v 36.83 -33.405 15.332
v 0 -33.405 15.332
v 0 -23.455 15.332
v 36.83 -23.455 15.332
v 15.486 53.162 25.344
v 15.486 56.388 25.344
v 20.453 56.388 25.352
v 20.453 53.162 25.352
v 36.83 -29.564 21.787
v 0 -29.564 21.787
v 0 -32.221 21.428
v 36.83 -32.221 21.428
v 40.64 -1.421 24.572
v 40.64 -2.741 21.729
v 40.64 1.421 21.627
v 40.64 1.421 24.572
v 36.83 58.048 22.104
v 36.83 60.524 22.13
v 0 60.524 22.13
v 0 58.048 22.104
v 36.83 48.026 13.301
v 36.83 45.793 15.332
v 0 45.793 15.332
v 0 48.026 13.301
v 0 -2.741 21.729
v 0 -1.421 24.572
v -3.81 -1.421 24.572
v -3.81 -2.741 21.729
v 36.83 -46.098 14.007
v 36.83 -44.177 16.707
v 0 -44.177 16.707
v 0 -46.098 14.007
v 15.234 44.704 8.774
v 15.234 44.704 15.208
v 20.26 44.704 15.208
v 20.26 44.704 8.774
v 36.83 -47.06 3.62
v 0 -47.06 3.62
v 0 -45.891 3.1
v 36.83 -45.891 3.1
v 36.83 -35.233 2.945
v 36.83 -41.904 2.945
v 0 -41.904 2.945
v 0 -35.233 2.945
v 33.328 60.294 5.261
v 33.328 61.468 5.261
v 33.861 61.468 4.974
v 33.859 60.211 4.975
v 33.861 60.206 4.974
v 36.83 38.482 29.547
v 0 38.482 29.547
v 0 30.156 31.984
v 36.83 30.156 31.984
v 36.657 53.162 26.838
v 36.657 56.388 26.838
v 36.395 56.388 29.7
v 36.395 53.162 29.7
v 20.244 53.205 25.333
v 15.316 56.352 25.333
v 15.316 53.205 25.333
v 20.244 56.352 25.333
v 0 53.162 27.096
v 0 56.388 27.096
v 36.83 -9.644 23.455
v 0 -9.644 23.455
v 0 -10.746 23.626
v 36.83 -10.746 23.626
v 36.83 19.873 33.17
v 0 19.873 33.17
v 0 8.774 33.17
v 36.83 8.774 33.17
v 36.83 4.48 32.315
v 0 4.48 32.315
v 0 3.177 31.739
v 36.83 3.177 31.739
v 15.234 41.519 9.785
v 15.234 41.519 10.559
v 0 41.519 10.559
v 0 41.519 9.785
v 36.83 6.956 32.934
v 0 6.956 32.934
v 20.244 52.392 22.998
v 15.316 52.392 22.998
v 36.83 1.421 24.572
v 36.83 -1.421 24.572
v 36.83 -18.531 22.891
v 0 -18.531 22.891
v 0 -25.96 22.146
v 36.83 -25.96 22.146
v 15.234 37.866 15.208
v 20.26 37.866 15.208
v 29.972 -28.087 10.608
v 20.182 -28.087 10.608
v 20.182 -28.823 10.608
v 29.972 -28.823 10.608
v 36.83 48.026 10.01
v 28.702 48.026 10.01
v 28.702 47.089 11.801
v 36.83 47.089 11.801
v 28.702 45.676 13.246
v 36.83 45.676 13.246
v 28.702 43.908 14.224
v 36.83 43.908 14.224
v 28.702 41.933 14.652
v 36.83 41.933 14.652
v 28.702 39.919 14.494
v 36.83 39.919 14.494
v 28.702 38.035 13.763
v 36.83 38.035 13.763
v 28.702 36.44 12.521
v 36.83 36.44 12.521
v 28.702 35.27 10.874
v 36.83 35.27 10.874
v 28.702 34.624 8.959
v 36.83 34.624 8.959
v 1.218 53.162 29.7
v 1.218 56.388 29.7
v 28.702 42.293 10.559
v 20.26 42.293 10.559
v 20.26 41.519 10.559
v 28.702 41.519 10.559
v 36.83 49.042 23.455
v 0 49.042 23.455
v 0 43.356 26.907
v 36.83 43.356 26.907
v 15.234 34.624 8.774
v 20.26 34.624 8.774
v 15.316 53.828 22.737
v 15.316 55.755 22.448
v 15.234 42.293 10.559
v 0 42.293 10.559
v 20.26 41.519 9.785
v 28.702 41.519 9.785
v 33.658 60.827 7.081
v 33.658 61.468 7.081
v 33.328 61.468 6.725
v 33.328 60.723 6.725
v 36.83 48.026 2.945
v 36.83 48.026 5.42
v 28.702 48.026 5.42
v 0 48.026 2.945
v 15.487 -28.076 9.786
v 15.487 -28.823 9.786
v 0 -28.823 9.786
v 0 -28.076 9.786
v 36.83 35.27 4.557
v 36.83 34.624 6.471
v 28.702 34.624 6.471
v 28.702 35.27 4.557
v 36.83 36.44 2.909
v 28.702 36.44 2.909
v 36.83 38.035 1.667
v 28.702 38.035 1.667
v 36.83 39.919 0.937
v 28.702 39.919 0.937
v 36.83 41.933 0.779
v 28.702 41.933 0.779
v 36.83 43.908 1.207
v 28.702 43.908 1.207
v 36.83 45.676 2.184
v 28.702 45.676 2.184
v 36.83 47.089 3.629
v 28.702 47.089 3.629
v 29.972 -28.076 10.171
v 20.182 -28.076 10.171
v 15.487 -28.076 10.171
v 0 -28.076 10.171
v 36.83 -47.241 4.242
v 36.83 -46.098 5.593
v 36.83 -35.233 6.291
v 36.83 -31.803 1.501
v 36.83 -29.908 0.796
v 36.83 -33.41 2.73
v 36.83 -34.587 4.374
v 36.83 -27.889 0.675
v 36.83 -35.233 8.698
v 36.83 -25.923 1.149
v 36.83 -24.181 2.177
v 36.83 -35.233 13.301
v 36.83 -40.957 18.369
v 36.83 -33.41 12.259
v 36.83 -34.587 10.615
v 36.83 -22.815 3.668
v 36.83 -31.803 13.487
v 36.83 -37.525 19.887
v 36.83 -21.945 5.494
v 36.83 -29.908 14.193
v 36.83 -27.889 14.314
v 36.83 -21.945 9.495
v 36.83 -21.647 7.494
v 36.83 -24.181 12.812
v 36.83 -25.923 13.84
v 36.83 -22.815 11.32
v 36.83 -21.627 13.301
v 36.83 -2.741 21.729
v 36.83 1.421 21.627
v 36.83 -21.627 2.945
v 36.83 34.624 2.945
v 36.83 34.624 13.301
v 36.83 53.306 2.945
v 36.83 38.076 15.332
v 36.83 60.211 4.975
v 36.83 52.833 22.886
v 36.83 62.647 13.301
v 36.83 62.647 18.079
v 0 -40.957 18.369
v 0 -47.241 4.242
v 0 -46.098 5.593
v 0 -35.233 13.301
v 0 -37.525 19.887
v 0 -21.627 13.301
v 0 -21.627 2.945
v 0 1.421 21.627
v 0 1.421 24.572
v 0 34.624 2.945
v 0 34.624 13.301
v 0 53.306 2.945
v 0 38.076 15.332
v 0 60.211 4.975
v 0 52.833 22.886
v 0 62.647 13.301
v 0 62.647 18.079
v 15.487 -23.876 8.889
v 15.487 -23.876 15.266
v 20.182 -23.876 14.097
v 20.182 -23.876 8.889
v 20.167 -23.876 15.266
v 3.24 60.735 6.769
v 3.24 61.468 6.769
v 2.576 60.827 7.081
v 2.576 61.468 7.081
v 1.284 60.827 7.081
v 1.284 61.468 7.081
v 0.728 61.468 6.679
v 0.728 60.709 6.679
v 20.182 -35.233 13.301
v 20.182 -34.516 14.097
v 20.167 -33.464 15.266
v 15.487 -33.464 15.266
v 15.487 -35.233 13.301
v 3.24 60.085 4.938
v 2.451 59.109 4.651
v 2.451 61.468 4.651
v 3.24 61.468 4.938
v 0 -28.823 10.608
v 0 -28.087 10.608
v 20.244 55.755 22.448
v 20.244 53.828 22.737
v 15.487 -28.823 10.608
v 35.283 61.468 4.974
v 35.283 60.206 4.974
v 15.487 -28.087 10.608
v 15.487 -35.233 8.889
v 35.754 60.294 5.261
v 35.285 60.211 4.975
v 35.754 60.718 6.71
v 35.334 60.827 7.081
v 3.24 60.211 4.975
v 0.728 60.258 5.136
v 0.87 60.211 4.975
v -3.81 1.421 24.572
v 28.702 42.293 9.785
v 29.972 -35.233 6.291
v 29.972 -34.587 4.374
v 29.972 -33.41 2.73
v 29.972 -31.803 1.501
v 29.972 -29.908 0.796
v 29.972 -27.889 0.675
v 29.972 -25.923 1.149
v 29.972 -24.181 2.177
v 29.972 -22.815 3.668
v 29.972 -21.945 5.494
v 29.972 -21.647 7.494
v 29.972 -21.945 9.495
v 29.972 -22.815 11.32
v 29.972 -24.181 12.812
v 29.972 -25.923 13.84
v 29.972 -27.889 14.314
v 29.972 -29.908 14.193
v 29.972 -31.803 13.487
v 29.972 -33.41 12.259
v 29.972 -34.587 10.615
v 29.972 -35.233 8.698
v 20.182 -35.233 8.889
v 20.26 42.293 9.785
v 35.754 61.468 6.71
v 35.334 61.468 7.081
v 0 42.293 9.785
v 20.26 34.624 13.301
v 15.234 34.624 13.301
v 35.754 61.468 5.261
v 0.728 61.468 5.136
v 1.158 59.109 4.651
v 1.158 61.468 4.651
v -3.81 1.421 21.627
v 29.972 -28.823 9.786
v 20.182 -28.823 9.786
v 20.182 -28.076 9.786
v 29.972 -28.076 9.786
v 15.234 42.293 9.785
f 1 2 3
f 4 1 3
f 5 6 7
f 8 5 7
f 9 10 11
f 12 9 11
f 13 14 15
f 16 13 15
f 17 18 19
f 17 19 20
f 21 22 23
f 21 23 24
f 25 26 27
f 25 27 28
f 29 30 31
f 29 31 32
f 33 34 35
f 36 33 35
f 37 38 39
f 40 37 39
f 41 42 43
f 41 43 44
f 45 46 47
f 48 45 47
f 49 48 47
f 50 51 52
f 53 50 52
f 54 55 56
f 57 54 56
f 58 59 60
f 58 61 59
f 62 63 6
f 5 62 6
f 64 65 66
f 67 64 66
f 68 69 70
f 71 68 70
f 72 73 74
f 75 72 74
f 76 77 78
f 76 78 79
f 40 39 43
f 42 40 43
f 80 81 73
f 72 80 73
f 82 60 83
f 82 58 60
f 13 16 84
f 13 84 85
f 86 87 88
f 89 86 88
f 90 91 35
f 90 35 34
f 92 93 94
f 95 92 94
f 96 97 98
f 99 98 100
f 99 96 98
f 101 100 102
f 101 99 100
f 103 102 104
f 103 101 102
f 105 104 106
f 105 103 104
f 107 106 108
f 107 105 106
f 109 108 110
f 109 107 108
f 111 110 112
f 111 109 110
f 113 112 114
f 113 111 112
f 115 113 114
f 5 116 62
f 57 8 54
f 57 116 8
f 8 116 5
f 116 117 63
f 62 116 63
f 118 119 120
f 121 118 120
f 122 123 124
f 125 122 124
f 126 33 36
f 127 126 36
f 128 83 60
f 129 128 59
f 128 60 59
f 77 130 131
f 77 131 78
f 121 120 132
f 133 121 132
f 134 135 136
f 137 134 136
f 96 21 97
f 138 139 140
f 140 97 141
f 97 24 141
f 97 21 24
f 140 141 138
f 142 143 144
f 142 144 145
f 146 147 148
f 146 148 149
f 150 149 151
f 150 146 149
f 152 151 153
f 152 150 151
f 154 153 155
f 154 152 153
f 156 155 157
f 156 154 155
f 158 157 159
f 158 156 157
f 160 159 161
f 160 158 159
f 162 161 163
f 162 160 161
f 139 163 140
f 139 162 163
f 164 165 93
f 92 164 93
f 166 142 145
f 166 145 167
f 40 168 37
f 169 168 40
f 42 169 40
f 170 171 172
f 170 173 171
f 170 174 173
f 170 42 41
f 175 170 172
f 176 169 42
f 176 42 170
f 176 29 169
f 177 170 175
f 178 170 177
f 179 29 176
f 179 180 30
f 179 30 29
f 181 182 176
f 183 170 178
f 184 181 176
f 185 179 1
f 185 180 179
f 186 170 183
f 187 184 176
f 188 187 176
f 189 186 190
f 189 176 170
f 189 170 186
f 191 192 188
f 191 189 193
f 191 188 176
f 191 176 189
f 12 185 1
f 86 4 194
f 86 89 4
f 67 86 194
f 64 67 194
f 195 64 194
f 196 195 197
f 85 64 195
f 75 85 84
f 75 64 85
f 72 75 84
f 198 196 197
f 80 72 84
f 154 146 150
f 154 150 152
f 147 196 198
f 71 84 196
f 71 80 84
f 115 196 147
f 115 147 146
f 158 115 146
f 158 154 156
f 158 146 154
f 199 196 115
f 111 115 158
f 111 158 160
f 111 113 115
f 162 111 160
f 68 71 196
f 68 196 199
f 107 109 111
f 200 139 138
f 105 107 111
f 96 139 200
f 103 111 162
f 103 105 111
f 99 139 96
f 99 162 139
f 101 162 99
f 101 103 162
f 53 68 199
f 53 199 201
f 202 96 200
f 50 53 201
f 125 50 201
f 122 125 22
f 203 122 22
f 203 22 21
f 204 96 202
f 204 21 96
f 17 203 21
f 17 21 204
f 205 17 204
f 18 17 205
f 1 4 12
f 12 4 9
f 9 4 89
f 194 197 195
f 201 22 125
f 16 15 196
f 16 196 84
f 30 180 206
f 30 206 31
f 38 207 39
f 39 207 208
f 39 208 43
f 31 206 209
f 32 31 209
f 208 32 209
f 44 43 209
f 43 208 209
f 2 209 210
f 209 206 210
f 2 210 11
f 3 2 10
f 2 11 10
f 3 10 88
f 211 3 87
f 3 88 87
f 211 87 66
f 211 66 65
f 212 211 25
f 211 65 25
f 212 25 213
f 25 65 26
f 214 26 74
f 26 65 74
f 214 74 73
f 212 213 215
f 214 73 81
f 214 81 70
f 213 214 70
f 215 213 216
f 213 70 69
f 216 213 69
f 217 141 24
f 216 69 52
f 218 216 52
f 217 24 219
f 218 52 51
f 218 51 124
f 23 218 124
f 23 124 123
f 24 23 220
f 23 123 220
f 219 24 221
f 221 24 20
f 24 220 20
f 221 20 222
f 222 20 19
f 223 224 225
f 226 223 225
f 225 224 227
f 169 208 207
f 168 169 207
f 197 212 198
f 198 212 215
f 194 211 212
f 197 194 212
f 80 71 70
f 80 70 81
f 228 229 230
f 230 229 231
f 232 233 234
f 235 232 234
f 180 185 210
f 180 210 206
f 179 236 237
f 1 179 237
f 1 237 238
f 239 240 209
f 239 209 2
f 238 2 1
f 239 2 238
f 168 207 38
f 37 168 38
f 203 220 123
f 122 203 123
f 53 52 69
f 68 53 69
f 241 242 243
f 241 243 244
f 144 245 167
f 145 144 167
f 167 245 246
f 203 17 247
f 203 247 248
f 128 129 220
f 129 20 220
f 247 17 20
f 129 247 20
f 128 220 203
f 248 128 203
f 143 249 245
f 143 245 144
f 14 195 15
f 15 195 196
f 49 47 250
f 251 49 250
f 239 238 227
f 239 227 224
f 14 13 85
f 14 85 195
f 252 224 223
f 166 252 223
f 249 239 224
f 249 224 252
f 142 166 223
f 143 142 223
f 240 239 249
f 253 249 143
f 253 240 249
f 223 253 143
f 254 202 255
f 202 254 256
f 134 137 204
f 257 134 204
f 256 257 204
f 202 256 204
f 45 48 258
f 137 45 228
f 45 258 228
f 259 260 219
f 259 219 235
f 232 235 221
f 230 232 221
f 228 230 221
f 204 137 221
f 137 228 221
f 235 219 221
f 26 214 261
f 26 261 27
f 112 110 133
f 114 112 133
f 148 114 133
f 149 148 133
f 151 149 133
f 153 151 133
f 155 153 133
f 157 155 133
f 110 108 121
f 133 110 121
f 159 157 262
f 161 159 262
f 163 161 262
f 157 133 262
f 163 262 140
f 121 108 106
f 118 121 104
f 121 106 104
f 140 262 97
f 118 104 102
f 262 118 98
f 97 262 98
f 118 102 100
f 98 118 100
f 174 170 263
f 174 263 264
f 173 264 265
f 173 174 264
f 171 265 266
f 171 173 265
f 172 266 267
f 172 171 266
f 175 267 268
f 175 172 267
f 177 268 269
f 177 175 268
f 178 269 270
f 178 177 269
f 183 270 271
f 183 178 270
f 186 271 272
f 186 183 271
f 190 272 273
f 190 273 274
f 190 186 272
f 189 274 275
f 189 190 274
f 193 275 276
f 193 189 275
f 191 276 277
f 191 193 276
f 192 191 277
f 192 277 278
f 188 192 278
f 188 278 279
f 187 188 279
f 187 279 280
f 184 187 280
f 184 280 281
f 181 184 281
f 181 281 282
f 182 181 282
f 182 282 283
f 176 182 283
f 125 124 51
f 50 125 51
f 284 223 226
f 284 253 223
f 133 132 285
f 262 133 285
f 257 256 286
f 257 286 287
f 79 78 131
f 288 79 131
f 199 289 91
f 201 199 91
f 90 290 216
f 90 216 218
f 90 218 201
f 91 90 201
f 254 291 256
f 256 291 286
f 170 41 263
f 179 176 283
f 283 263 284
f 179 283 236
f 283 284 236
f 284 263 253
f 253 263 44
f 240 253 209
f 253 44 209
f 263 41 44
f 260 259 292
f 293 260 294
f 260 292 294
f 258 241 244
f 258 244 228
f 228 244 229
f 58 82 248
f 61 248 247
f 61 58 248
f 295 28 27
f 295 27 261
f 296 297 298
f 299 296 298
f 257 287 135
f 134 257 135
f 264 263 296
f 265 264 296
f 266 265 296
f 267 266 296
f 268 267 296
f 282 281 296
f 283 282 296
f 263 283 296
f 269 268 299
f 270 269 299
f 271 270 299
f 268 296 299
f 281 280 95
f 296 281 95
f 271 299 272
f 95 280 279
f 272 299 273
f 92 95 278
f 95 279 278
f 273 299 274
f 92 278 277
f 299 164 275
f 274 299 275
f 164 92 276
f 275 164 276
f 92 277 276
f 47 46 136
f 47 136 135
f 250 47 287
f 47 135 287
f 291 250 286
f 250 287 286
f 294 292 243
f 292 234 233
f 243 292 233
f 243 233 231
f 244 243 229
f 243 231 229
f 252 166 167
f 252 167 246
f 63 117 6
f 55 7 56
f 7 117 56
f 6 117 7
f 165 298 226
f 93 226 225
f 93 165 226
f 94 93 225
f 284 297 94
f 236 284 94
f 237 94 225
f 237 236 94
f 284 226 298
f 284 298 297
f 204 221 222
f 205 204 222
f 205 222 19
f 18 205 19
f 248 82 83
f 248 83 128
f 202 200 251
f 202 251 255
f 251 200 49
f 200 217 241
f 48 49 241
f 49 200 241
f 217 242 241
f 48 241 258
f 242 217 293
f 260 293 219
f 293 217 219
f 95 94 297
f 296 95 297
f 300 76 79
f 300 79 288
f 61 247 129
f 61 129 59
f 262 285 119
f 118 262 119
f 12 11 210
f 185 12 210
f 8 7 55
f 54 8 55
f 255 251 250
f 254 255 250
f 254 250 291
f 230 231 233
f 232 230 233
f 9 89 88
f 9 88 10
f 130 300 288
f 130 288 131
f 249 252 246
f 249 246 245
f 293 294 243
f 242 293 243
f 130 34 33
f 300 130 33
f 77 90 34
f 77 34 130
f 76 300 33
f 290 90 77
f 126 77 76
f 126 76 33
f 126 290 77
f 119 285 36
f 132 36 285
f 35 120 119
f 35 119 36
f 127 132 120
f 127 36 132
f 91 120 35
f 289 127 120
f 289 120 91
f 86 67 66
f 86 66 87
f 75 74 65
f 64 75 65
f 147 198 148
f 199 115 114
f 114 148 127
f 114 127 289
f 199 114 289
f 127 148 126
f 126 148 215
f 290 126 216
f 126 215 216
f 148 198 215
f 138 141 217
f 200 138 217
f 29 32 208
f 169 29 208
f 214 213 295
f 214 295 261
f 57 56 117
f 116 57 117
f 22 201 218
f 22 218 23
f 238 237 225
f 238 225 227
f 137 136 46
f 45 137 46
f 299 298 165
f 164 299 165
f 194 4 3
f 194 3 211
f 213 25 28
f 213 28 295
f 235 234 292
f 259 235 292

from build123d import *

# Parameters (mm, degrees)
F1_DEPTH       = 36.83
F1_FACE_W      = 36.83
F1_FACE_H      = 5.5427631503
F4_DEPTH       = 3.2258
F7_DEPTH       = 2.4638
F7_DEPTH_BACK  = 2.4638
F10_DEPTH      = 3.81
F10_DEPTH_BACK = 40.64
F13_DEPTH      = 7.366
F13_DEPTH_BACK = 2.794
F16_DEPTH      = 7.366
F16_DEPTH_BACK = 4.572
F18_DEPTH      = 19.05
F18_DEPTH_BACK = 17.78
F20_DEPTH      = 19.05
F20_DEPTH_BACK = 17.78
F23_DEPTH      = 3.2004
F24_R          = 6.8463862677
F25_DEPTH      = 6.858
F26_R          = 6.9523831829
F27_DEPTH      = 8.128


with BuildPart() as f1:
    # F0 (on Right) → F1 (new body)
    with BuildSketch(Plane.YZ):
        Polygon((48.0263121426, 2.9445304535), (53.3061549067, 2.9445304535), (60.210570693, 4.9752411433), (62.6474246383, 13.3011555299), (62.6474246383, 18.0792529136), (60.523532331, 22.1303328872), (58.04841407, 22.1036953967), (52.8332734047, 22.8859669748), (49.0416623652, 23.4547089785), (43.3556735516, 26.9069168717), (38.481965661, 29.5468401164), (30.1560536027, 31.983692199), (19.8732633144, 33.1698097289), (8.7737506256, 33.1698097289), (6.955573801, 32.9344496131), (4.4795288704, 32.3154367507), (3.1774702948, 31.739115715), (-9.6437809989, 23.4547089785), (-10.7455300167, 23.6257594079), (-18.5312218964, 22.8912606835), (-25.9602405131, 22.1459884197), (-29.5640733093, 21.787006408), (-32.2205424309, 21.4280243963), (-37.5245548785, 19.887233153), (-40.9566648304, 18.3693002909), (-44.1767536104, 16.7073179036), (-46.0984222591, 14.0065979213), (-46.0984222591, 7.6183550991), (-46.0984222591, 5.5928146467), (-47.2410358489, 4.2424551211), (-47.0601624299, 3.6198173241), (-45.890673995, 3.0998424627), (-41.9041402638, 2.9445304535), (-39.671524707, 2.9445304535), (-35.2328307927, 2.9445304535), (-35.2328307927, 13.3011555299), (-33.4051921964, 15.3318652883), (-23.4547089785, 15.3318652883), (-21.6270685196, 13.3011555299), (-21.6270685196, 2.9445304535), (34.6236154437, 2.9445304535), (34.6236154437, 13.3011555299), (38.0758270621, 15.3318652883), (45.7925237715, 15.3318652883), (48.0263121426, 13.3011555299), align=None)
    extrude(amount=F1_DEPTH)

    # F3 (on offset) + F1_face (on face) → F4 (join)
    with BuildSketch(Plane.XZ.offset(-56.388)):
        Polygon((15.4859535396, 25.3441482782), (20.4525850713, 25.3516733646), (36.6573445499, 26.837669313), (36.3948243914, 29.700446989), (1.2181646889, 29.700446989), (0, 27.0956344903), align=None)
    with BuildSketch(Plane(origin=(18.415, 40.9188196063, 28.226878494), x_dir=(-1, 0, 0), z_dir=(0, 0.4762828887, 0.8792921073))):
        Rectangle(F1_FACE_W, F1_FACE_H)
    extrude(amount=F4_DEPTH, dir=(0, -1, 0))

    # F6 (on offset) → F7 (join, two sides)
    with BuildSketch(Plane.YZ.offset(17.78)) as f7_sk:
        Polygon((53.2046183944, 25.333115831), (52.3923374712, 22.9977983981), (55.743008852, 22.3885849118), (56.3522204757, 25.333115831), align=None)
    extrude(amount=F7_DEPTH)
    extrude(f7_sk.sketch, amount=-F7_DEPTH_BACK)

    # F9 (on offset) → F10 (join, two sides)
    with BuildSketch(Plane.YZ.offset(36.83)) as f10_sk:
        Polygon((-1.4214976691, 24.5715994388), (-2.7414595243, 21.728605032), (1.4214974362, 21.6270703822), (1.4214974362, 24.5715994388), align=None)
    extrude(amount=F10_DEPTH)
    extrude(f10_sk.sketch, amount=-F10_DEPTH_BACK)

    # F12 (on offset) → F13 (join, two sides)
    with BuildSketch(Plane.XZ.offset(-41.91)) as f13_sk:
        Polygon((20.2600434422, 8.7743336335), (20.2600434422, 9.910594672), (20.2600434422, 15.2083793655), (15.2342896909, 15.2083793655), (15.2342896909, 9.910594672), (15.2342896909, 8.7743336335), align=None)
    extrude(amount=F13_DEPTH)
    extrude(f13_sk.sketch, amount=-F13_DEPTH_BACK)

    # F15 (on offset) → F16 (join, two sides)
    with BuildSketch(Plane.XZ.offset(28.448)) as f16_sk:
        Polygon((20.1824773103, 8.8890520856), (20.1824773103, 14.0972845256), (20.1671663672, 15.2659900486), (15.4865300283, 15.2659900486), (15.4865300283, 14.0972845256), (15.4865300283, 8.8890520856), align=None)
    extrude(amount=F16_DEPTH)
    extrude(f16_sk.sketch, amount=-F16_DEPTH_BACK)

    # F17 (on offset) → F18 (join, two sides)
    with BuildSketch(Plane.YZ.offset(17.78)) as f18_sk:
        Polygon((-28.0869510025, 10.6080779806), (-28.4391473979, 10.6080779806), (-28.8233608007, 10.6080779806), (-28.8233608007, 10.1705007255), (-28.8233608007, 9.7862863913), (-28.4498203546, 9.7862863913), (-28.0762780458, 9.7862863913), (-28.0762780458, 10.1705007255), align=None)
    extrude(amount=F18_DEPTH)
    extrude(f18_sk.sketch, amount=-F18_DEPTH_BACK)

    # F19 (on offset) → F20 (join, two sides)
    with BuildSketch(Plane.YZ.offset(17.78)) as f20_sk:
        Polygon((42.2930158675, 10.5587802827), (41.8995656073, 10.5587802827), (41.5188074112, 10.5587802827), (41.5188074112, 9.7845718265), (41.8995656073, 9.7845718265), (42.2930158675, 9.7845718265), (42.2930158675, 10.1780220866), align=None)
    extrude(amount=F20_DEPTH)
    extrude(f20_sk.sketch, amount=-F20_DEPTH_BACK)

    # F22 (on offset) → F23 (join)
    with BuildSketch(Plane.XZ.offset(-61.468)):
        Polygon((35.7542745769, 5.260670092), (35.7542745769, 6.7096315324), (35.3337042034, 7.0807840675), (33.6583703756, 7.0807840675), (33.3283767104, 6.7254095338), (33.3283767104, 5.260670092), (33.8614396751, 4.9739219248), (35.2829359472, 4.9739219248), align=None)
        Polygon((3.2403937075, 4.9383174628), (3.2403937075, 6.768678176), (2.5762754958, 7.0807840675), (1.283939695, 7.0807840675), (0.7275173557, 6.6793817095), (0.7275173557, 5.135757383), (1.1582964798, 4.6511315741), (2.4506326299, 4.6511315741), align=None)
    extrude(amount=F23_DEPTH)

    # F24 (on offset) → F25 (join)
    with BuildSketch(Plane.YZ.offset(36.83)):
        with Locations((-28.4930635244, 7.4944184162)):
            Circle(F24_R)
    extrude(amount=-F25_DEPTH)

    # F26 (on offset) → F27 (join)
    with BuildSketch(Plane.YZ.offset(36.83)):
        with Locations((41.4637811482, 7.7151083387)):
            Circle(F26_R)
    extrude(amount=-F27_DEPTH)


solid = f1.part
